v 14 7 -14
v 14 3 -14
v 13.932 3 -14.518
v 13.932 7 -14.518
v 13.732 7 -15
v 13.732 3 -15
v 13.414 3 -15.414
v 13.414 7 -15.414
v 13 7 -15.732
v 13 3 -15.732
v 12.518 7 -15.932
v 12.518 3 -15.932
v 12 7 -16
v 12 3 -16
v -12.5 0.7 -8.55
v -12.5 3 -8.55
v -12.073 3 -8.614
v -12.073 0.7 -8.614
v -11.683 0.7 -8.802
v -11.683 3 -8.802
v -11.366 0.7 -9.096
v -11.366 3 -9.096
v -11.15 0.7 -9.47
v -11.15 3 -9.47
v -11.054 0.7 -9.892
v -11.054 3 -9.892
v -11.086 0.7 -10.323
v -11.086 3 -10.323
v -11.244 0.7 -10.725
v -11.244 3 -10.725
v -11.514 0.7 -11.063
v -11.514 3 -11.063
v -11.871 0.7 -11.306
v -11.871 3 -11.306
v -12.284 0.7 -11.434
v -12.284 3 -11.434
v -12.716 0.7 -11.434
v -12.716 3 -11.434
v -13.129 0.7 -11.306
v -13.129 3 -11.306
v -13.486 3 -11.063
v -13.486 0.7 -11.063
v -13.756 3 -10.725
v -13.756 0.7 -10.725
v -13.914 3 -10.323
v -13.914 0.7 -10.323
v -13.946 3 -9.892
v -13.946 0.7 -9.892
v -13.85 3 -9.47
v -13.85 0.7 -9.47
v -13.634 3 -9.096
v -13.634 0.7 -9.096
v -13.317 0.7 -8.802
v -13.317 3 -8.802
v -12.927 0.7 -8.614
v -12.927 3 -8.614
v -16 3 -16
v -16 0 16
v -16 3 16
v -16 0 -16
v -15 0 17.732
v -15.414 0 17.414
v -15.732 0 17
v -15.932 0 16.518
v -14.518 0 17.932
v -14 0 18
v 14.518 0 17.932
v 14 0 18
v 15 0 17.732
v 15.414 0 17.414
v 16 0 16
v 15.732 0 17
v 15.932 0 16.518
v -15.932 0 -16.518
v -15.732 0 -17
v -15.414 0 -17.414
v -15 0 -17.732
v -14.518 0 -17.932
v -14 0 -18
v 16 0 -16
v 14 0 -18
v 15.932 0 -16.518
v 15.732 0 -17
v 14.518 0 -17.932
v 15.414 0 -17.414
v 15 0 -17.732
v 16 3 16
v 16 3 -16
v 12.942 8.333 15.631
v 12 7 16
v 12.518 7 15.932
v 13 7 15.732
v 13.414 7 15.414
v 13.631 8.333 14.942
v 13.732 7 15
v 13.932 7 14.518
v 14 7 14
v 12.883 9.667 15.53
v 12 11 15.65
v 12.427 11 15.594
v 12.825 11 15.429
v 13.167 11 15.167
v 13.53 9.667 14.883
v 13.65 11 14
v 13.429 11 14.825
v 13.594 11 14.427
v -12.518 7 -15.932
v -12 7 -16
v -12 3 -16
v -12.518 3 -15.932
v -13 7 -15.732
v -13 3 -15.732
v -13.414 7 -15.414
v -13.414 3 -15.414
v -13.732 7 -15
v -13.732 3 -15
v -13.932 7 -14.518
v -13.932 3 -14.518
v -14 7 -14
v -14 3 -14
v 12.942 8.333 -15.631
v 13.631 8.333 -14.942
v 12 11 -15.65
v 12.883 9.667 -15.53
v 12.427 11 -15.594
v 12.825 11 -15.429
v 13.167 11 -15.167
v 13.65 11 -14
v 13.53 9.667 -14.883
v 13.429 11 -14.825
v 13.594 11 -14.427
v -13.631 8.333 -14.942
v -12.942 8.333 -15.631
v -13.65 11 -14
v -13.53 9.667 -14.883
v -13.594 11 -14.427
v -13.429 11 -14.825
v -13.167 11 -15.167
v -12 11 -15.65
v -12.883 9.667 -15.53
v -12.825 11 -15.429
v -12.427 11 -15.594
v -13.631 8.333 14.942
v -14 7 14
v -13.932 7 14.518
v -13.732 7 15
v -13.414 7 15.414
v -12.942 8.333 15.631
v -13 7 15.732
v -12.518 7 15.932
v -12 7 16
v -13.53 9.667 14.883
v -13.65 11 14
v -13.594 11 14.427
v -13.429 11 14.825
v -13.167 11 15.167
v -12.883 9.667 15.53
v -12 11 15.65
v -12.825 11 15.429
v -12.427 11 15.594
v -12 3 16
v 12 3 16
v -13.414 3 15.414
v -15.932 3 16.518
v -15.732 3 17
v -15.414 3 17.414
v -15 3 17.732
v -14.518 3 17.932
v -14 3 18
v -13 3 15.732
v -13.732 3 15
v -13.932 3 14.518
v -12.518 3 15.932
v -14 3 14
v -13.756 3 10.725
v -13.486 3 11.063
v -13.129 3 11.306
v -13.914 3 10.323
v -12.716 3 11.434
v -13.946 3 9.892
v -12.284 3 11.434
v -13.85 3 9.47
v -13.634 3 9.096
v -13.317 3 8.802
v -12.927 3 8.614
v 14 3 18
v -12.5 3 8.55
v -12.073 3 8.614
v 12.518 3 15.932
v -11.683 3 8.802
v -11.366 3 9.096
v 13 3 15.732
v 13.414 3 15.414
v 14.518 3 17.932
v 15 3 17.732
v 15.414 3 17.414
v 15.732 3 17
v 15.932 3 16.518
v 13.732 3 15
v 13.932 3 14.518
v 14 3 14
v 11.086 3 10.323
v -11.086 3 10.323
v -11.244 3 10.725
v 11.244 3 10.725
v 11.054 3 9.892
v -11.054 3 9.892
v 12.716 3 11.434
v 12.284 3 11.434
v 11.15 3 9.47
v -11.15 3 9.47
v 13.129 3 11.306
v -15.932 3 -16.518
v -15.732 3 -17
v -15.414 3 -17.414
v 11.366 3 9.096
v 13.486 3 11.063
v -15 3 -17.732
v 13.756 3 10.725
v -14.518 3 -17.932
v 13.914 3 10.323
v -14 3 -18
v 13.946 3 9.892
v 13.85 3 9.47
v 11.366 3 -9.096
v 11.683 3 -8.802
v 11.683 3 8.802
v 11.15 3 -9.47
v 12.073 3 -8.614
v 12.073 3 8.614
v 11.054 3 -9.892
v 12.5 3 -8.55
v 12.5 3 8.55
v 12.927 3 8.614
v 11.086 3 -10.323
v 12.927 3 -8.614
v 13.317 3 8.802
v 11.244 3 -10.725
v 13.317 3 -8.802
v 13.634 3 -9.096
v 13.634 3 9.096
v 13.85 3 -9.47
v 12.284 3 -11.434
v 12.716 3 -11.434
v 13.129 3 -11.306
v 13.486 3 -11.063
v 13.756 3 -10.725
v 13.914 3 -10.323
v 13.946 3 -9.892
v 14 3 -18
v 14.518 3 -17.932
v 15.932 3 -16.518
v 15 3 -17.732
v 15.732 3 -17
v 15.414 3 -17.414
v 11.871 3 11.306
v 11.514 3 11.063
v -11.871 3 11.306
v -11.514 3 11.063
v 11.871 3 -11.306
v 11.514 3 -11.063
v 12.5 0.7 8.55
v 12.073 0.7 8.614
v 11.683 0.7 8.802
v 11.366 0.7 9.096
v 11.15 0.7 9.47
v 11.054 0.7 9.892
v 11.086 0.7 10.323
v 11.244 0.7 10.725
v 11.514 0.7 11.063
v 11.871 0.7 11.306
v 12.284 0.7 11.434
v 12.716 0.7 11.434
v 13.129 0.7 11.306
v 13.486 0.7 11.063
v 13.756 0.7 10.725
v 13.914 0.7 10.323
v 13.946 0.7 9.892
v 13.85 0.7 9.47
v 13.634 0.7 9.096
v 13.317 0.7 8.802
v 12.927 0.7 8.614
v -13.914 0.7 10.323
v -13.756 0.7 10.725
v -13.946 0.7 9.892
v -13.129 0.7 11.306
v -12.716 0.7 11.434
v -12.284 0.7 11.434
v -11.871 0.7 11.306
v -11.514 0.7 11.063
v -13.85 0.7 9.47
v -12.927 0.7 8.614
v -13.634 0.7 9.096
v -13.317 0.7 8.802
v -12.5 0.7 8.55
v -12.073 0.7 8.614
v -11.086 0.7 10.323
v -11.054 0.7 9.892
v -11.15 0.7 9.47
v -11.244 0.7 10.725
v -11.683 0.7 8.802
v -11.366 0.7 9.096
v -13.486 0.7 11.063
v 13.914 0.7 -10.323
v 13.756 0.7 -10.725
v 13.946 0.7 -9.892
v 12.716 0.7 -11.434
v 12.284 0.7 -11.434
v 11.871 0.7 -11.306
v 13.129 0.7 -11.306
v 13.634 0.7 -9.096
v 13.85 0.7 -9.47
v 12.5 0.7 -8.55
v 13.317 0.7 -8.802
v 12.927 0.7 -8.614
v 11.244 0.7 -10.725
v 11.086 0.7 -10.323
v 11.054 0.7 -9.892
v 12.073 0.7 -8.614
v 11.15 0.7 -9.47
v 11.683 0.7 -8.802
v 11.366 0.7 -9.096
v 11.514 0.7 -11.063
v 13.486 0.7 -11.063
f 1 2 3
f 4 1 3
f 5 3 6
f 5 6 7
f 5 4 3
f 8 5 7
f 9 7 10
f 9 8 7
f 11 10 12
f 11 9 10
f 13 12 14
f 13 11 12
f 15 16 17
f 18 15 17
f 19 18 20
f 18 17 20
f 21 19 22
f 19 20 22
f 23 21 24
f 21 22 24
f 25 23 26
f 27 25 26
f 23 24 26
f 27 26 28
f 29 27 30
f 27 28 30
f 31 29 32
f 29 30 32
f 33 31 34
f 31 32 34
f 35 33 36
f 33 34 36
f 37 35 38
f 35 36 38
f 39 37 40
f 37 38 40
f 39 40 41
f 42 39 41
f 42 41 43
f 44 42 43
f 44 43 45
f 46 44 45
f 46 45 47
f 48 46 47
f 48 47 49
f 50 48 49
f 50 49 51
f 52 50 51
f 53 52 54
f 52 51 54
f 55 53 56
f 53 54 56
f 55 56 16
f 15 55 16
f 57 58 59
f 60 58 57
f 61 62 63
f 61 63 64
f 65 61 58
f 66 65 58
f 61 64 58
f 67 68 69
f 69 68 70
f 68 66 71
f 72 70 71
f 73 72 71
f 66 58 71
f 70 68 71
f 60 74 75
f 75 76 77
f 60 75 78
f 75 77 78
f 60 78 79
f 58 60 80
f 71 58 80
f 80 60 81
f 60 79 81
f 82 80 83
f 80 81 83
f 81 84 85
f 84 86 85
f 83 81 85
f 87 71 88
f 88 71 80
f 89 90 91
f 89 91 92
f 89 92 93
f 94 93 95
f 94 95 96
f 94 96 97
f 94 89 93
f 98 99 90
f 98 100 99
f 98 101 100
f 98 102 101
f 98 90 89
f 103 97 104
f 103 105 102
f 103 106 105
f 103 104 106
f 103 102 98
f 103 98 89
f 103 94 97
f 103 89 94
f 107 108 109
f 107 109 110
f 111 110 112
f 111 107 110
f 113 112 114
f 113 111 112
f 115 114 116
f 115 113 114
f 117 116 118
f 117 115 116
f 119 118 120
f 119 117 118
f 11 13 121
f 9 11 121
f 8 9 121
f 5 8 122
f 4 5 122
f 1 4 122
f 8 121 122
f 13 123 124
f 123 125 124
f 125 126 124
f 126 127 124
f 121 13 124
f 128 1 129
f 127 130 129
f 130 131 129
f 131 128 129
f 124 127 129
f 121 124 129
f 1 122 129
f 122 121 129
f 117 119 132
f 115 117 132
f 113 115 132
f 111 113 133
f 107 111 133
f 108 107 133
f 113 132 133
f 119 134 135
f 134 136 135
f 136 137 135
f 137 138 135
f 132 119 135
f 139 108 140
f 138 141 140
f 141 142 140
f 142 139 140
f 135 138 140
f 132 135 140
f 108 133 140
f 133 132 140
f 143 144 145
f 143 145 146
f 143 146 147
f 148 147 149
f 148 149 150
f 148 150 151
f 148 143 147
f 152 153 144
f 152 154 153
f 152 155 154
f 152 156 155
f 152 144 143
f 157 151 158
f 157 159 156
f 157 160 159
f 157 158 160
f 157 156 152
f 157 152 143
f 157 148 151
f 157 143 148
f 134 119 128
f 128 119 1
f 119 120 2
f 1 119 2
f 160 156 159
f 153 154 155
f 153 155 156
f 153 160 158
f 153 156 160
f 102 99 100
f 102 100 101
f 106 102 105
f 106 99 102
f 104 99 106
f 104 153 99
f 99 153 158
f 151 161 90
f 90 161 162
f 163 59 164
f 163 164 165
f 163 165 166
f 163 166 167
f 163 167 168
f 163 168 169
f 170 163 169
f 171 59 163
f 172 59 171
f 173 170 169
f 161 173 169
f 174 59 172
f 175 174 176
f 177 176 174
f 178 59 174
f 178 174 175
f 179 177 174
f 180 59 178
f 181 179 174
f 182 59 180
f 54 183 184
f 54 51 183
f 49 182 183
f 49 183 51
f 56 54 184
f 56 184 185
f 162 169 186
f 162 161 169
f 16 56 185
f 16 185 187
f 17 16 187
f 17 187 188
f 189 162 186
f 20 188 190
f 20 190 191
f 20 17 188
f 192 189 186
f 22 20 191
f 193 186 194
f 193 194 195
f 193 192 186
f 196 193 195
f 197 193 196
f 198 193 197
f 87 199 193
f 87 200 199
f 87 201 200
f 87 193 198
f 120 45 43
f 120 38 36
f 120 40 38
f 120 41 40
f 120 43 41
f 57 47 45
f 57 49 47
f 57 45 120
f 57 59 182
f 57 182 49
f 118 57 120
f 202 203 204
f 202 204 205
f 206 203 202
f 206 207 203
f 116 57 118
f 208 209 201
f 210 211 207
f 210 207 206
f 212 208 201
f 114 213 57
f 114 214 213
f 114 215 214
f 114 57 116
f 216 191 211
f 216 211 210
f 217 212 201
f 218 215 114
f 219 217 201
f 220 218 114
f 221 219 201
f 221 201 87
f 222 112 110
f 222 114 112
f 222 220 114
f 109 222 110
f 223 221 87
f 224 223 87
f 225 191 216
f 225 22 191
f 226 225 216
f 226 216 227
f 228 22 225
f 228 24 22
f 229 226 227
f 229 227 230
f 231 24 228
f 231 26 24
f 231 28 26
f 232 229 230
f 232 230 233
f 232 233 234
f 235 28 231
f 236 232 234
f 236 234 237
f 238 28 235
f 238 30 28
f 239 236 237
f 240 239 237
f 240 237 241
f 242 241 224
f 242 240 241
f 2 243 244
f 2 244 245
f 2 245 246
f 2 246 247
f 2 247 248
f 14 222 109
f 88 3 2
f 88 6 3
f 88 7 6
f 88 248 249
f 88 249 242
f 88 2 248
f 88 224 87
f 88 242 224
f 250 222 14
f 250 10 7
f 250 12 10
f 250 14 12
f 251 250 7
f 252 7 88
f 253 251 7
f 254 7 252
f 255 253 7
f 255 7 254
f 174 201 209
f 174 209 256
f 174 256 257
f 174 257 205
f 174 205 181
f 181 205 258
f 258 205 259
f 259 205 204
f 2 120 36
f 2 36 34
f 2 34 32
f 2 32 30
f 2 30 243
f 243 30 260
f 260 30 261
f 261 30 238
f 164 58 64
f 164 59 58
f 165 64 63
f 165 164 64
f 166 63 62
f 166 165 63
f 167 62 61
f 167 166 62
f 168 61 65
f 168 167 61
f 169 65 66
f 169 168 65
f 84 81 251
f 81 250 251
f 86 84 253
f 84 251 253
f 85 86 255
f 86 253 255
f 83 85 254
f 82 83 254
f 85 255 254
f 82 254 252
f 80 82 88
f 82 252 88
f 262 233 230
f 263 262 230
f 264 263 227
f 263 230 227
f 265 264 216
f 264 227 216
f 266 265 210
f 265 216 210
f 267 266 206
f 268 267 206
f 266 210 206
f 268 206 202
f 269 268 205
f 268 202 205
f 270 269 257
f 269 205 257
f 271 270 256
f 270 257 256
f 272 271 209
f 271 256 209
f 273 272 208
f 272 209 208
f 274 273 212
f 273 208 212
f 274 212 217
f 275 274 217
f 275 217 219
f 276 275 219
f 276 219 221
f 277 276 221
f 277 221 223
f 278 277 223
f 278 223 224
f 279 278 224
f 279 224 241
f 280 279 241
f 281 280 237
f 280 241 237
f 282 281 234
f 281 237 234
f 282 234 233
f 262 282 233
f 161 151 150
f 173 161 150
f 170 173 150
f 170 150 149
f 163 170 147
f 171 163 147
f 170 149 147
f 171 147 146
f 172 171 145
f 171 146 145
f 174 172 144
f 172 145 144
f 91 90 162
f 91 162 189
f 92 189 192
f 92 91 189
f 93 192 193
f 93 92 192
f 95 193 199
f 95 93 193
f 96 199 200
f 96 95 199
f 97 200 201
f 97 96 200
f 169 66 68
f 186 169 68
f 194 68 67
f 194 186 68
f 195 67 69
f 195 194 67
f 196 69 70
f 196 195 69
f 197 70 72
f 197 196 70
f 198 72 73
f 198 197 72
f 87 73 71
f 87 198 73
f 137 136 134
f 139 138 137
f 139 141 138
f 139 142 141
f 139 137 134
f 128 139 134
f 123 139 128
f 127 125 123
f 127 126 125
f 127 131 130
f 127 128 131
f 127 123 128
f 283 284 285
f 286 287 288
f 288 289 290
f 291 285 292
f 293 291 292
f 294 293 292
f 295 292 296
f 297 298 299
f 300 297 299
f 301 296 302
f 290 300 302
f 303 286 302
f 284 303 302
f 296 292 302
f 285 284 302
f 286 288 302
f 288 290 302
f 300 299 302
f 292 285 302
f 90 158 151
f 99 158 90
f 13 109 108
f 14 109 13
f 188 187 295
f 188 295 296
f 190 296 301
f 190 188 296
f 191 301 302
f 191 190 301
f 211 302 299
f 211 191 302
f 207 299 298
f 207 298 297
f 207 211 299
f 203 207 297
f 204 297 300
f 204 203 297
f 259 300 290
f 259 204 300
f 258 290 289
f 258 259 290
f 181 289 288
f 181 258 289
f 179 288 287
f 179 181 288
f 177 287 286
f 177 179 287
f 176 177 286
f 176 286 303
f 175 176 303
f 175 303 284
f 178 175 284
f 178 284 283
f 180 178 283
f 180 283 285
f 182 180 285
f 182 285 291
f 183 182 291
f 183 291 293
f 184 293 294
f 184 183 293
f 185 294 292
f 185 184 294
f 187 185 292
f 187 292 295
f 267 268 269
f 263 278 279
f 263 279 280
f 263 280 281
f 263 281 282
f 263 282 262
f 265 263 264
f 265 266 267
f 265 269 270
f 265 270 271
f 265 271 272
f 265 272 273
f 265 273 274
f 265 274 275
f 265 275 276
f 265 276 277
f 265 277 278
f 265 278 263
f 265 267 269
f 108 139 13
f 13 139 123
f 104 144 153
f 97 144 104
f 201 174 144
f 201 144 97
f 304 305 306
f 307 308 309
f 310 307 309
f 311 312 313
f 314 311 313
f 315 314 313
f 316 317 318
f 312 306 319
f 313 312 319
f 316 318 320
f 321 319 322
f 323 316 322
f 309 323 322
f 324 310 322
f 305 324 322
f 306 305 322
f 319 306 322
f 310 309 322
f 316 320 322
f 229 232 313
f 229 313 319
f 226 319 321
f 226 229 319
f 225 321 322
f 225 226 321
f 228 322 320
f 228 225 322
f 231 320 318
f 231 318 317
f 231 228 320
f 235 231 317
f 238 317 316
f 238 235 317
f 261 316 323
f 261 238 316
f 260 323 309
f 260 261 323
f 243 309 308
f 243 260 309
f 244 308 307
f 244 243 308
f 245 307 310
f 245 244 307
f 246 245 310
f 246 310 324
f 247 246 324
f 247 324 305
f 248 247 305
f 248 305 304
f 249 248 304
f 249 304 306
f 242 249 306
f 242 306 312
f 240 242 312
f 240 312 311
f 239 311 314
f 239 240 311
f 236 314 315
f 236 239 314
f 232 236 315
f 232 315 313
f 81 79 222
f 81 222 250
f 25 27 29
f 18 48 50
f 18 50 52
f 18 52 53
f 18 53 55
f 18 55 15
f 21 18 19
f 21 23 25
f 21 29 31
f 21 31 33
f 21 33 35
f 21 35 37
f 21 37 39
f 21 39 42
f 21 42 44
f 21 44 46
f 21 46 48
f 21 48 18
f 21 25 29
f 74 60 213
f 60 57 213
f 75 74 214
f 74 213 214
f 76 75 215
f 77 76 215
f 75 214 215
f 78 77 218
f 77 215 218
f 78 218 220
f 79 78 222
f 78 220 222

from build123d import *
from OCP.BRepFilletAPI import BRepFilletAPI_MakeChamfer

# Parameters (mm, degrees)
SKETCH1_W                                  = 32
SKETCH1_H                                  = 36
BOSS_EXTRUDE1_DEPTH                        = 3
SKETCH4_W                                  = 28
SKETCH4_H                                  = 2
BOSS_EXTRUDE3_DEPTH                        = 8
FILLET4_R                                  = 2
CHAMFER2_SIZE                              = 4
CHAMFER2_SIZE2                             = 0.349954654
SKETCH5_R                                  = 1.45
CUT_EXTRUDE1_DEPTH                         = 2.3
MIRROR1_AT_THE_SECOND_PLANE_COPY_1_SKETC_R = 1.45
MIRROR1_AT_THE_SECOND_PLANE_COPY_1_DEPTH   = 2.3


with BuildPart() as part:
    # Sketch1 → Boss-Extrude1 (new body)
    with BuildSketch(Plane(origin=(0, 0, 0), x_dir=(1, 0, 0), z_dir=(0, 1, 0))):
        Rectangle(SKETCH1_W, SKETCH1_H)
    extrude(amount=BOSS_EXTRUDE1_DEPTH)

    # Sketch4 → Boss-Extrude3 (add)
    with BuildSketch(Plane(origin=(0, 3, 0), x_dir=(1, 0, 0), z_dir=(0, 1, 0))):
        with Locations((0, 15)):
            Rectangle(SKETCH4_W, SKETCH4_H)
        with Locations((0, -15)):
            Rectangle(SKETCH4_W, SKETCH4_H)
    extrude(amount=BOSS_EXTRUDE3_DEPTH)

    # Fillet4
    fillet4_edges = [part.edges().sort_by_distance(p)[0] for p in [
        (14, 7, -16),
        (14, 7, 16),
        (-16, 1.5, 18),
        (16, 1.5, 18),
        (-16, 1.5, -18),
        (16, 1.5, -18),
        (-14, 7, 16),
        (-14, 7, -16),
    ]]
    fillet(fillet4_edges, radius=FILLET4_R - 0.0001)  # a hair under: the kernel refuses the full size

    # Chamfer2: one chamfer whose edges measure the first distance from different faces: ONE call of the kernel's chamfer builder (chamfer() names one face for all edges)
    chamfer2_edges_1 = [part.edges().sort_by_distance(p)[0] for p in [
        (0, 11, 16),
    ]]
    chamfer2_side_1 = [part.faces().sort_by_distance(p)[0] for p in [
        (0, 7, 16),
    ]]
    chamfer2_edges_2 = [part.edges().sort_by_distance(p)[0] for p in [
        (13.414242852, 11, 15.414242852),
    ]]
    chamfer2_side_2 = [part.faces().sort_by_distance(p)[0] for p in [
        (13.414242852, 7, 15.414242852),
    ]]
    chamfer2_edges_3 = [part.edges().sort_by_distance(p)[0] for p in [
        (-13.414242852, 11, 15.414242852),
    ]]
    chamfer2_side_3 = [part.faces().sort_by_distance(p)[0] for p in [
        (-13.414242852, 7, 15.414242852),
    ]]
    chamfer2_edges_4 = [part.edges().sort_by_distance(p)[0] for p in [
        (0, 11, -16),
    ]]
    chamfer2_side_4 = [part.faces().sort_by_distance(p)[0] for p in [
        (0, 7, -16),
    ]]
    chamfer2_edges_5 = [part.edges().sort_by_distance(p)[0] for p in [
        (13.414242852, 11, -15.414242852),
    ]]
    chamfer2_side_5 = [part.faces().sort_by_distance(p)[0] for p in [
        (13.414242852, 7, -15.414242852),
    ]]
    chamfer2_edges_6 = [part.edges().sort_by_distance(p)[0] for p in [
        (-13.414242852, 11, -15.414242852),
    ]]
    chamfer2_side_6 = [part.faces().sort_by_distance(p)[0] for p in [
        (-13.414242852, 7, -15.414242852),
    ]]
    chamfer2 = BRepFilletAPI_MakeChamfer(part.part.solid().wrapped)
    for e in chamfer2_edges_1:
        chamfer2.Add(CHAMFER2_SIZE, CHAMFER2_SIZE2, e.wrapped, chamfer2_side_1[0].wrapped)  # the first distance lies on this face
    for e in chamfer2_edges_2:
        chamfer2.Add(CHAMFER2_SIZE, CHAMFER2_SIZE2, e.wrapped, chamfer2_side_2[0].wrapped)  # the first distance lies on this face
    for e in chamfer2_edges_3:
        chamfer2.Add(CHAMFER2_SIZE, CHAMFER2_SIZE2, e.wrapped, chamfer2_side_3[0].wrapped)  # the first distance lies on this face
    for e in chamfer2_edges_4:
        chamfer2.Add(CHAMFER2_SIZE, CHAMFER2_SIZE2, e.wrapped, chamfer2_side_4[0].wrapped)  # the first distance lies on this face
    for e in chamfer2_edges_5:
        chamfer2.Add(CHAMFER2_SIZE, CHAMFER2_SIZE2, e.wrapped, chamfer2_side_5[0].wrapped)  # the first distance lies on this face
    for e in chamfer2_edges_6:
        chamfer2.Add(CHAMFER2_SIZE, CHAMFER2_SIZE2, e.wrapped, chamfer2_side_6[0].wrapped)  # the first distance lies on this face
    add(Compound.cast(chamfer2.Shape()), mode=Mode.REPLACE)

    # Sketch5 → Cut-Extrude1 (cut)
    with BuildSketch(Plane(origin=(0, 3, 0), x_dir=(1, 0, 0), z_dir=(0, 1, 0))):
        with Locations(Location((-12.5, 10, 0), (0, 0, 270))):
            Circle(SKETCH5_R)
    cut_extrude1 = extrude(amount=-CUT_EXTRUDE1_DEPTH, mode=Mode.SUBTRACT)

    # Mirror1: Cut-Extrude1 across plane
    add(cut_extrude1.mirror(Plane(origin=(0, 0, 0), x_dir=(0, 0, 1), z_dir=(1, 0, 0))), mode=Mode.SUBTRACT)

    # Mirror1 at the second plane: Cut-Extrude1 across plane
    add(cut_extrude1.mirror(Plane.XY), mode=Mode.SUBTRACT)

    # Mirror1 at the second plane copy 1 sketc → Mirror1 at the second plane copy 1 (cut)
    with BuildSketch(Plane(origin=(0, 3, 0), x_dir=(-1, 0, 0), z_dir=(0, 1, 0))):
        with Locations(Location((-12.5, 10, 0), (0, 0, 270))):
            Circle(MIRROR1_AT_THE_SECOND_PLANE_COPY_1_SKETC_R)
    extrude(amount=-MIRROR1_AT_THE_SECOND_PLANE_COPY_1_DEPTH, mode=Mode.SUBTRACT)


solid = part.part
